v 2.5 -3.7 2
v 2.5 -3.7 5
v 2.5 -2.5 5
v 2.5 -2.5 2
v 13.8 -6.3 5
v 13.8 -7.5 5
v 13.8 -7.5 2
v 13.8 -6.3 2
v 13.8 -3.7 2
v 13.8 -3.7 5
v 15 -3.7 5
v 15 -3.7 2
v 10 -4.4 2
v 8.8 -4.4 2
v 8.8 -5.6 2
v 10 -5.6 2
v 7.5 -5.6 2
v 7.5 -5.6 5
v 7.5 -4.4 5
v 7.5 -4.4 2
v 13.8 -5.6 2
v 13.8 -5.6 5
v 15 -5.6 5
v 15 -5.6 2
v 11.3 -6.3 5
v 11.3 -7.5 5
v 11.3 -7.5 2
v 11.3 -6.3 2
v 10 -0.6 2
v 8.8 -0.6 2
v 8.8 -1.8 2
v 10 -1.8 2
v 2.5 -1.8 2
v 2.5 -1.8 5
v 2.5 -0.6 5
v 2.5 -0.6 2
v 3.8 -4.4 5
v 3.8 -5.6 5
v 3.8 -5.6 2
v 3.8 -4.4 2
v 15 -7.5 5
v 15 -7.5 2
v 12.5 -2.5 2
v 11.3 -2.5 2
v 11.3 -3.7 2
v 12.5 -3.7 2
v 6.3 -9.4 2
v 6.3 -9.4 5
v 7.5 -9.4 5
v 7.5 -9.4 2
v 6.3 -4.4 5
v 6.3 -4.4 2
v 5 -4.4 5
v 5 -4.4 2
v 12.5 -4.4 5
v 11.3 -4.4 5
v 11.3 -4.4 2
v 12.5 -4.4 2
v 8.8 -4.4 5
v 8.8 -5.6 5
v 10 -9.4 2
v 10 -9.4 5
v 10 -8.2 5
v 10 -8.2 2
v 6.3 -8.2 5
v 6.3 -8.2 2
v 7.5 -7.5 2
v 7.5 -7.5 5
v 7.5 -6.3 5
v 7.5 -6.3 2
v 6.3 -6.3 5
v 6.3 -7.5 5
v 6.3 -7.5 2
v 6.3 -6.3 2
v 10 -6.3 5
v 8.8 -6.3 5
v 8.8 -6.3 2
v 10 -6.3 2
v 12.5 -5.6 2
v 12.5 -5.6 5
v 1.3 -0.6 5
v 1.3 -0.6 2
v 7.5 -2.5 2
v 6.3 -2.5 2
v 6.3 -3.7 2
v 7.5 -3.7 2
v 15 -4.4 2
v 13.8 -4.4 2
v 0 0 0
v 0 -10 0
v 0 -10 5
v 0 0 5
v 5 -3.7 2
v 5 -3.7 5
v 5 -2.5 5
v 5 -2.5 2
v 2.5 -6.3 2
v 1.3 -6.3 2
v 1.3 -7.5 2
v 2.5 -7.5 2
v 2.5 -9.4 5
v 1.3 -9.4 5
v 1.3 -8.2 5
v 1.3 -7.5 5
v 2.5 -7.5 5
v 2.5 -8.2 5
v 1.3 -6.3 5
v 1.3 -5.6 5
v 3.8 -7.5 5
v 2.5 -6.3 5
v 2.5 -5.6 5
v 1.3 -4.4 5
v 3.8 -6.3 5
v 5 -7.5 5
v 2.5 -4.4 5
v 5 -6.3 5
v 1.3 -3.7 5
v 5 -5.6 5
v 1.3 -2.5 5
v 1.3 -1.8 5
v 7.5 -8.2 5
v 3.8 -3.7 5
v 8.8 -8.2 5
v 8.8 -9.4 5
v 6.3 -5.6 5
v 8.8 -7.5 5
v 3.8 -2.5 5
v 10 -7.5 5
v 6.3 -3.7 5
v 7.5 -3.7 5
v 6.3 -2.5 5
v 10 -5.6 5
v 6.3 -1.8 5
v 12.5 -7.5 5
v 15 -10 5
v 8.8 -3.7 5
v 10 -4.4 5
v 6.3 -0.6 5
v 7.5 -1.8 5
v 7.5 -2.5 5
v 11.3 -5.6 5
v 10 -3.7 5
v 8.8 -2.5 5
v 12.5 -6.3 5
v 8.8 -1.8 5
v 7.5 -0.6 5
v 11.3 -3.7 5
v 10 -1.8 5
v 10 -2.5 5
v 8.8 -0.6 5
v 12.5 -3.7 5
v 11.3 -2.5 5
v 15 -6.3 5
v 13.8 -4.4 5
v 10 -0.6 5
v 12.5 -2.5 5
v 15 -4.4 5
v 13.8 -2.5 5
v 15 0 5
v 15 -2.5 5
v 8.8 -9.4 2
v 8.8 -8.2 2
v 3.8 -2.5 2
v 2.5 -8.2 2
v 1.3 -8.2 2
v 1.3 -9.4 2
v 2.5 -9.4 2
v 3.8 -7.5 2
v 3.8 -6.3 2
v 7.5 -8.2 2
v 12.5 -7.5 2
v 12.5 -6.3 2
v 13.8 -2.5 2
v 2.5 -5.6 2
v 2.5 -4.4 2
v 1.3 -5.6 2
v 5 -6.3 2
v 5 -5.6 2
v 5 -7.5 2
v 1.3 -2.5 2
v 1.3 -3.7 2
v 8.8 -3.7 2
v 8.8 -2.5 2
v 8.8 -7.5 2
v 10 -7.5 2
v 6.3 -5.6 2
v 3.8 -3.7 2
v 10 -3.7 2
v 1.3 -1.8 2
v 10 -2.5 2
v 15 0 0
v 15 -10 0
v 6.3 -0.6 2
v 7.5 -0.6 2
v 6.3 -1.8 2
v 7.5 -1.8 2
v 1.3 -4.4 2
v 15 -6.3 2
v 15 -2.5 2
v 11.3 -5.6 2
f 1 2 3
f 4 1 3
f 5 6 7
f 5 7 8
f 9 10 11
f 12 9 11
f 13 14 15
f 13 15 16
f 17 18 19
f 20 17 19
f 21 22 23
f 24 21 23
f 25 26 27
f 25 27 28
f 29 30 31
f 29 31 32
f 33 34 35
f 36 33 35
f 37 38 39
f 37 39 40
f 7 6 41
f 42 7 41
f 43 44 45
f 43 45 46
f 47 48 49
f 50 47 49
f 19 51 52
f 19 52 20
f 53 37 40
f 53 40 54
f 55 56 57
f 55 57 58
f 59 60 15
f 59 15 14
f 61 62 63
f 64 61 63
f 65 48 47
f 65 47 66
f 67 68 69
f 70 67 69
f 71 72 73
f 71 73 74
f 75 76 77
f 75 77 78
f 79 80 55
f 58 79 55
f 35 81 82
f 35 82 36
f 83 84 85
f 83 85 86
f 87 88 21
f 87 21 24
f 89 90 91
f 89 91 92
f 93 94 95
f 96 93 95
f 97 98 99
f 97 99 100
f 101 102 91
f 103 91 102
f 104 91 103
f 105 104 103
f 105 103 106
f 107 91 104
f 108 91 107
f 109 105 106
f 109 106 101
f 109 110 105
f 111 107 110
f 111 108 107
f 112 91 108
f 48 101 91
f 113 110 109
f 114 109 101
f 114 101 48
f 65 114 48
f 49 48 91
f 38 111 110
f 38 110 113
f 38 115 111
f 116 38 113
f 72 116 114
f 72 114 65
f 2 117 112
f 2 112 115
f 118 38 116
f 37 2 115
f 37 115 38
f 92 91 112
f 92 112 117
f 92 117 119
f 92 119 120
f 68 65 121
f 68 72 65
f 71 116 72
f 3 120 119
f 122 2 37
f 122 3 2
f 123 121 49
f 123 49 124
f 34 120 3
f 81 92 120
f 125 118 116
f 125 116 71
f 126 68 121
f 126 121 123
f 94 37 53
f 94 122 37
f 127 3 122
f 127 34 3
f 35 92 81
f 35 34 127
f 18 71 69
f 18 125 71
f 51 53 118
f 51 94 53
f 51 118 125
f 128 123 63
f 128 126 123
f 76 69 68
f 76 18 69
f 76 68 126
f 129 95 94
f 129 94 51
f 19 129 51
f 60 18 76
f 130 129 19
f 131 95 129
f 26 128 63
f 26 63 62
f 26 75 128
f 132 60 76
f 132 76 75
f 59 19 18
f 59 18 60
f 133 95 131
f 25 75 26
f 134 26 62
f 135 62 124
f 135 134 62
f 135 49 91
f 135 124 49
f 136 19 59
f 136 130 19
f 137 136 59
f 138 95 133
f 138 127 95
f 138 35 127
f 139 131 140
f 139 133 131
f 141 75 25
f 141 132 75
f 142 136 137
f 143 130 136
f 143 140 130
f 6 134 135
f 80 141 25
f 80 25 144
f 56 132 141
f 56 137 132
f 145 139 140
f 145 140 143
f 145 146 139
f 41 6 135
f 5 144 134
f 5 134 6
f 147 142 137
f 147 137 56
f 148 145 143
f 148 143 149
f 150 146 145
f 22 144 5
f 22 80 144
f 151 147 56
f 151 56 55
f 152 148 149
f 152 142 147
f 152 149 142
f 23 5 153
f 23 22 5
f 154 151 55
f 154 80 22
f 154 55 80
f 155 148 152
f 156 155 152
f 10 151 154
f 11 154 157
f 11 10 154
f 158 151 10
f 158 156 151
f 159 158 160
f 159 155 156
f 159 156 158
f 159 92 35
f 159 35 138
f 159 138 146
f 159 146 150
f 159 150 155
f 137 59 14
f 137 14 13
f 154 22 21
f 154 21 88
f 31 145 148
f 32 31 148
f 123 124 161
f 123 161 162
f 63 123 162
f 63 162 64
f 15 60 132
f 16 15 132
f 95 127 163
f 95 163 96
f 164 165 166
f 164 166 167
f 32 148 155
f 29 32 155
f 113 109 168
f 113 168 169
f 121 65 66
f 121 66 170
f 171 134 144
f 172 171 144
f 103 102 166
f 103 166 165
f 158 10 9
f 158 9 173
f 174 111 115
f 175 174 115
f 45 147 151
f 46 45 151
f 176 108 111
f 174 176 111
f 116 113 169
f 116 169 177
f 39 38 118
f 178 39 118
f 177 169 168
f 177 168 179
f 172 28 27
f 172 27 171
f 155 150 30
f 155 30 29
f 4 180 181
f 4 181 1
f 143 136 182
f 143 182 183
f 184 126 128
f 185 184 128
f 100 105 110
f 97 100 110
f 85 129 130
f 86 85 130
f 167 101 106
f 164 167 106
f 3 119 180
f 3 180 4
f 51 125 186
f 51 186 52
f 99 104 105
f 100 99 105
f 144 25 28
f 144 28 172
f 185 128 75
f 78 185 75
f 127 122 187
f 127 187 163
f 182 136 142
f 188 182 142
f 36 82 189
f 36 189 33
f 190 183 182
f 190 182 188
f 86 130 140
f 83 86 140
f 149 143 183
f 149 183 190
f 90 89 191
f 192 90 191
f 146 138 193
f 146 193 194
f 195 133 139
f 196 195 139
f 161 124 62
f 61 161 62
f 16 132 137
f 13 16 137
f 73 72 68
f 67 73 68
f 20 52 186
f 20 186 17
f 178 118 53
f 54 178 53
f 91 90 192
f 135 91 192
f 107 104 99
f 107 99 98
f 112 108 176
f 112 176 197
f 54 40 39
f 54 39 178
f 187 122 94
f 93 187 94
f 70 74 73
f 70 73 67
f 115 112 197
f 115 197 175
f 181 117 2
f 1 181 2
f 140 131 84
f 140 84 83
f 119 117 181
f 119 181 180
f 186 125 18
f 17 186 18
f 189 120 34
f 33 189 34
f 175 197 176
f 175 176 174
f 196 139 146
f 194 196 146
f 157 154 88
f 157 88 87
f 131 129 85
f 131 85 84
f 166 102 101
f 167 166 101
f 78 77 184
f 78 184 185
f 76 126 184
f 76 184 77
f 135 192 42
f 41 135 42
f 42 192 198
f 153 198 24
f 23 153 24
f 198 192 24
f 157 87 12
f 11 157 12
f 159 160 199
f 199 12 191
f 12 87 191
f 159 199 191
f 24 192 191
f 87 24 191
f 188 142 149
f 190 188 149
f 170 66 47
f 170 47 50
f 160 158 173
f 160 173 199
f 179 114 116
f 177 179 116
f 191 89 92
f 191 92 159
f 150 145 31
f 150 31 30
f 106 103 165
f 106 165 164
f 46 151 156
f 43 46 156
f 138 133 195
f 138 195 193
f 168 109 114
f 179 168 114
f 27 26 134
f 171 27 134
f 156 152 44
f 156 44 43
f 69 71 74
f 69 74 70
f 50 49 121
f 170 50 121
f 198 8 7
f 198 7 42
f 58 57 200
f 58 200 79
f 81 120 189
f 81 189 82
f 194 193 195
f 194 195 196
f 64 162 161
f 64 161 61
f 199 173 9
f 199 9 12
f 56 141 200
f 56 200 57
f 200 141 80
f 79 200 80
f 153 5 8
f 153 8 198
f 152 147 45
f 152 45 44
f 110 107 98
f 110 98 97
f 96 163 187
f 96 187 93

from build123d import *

# Parameters (mm, degrees)
SKETCH_1_W          = 15
SKETCH_1_H          = 10
EXTRUDE_1_DEPTH     = 5
SKETCH_2_W          = 1.2
SKETCH_2_H          = 1.2
CUT_EXTRUDE_1_DEPTH = 3


with BuildPart() as part:
    # 草图1 → 凸台-拉伸1 (new body)
    with BuildSketch(Plane.XY):
        with Locations((7.5, -5)):
            Rectangle(SKETCH_1_W, SKETCH_1_H)
    extrude(amount=EXTRUDE_1_DEPTH)

    # 草图2 → 切除-拉伸1 (cut)
    with BuildSketch(Plane.XY.offset(5)):
        with Locations((1.9, -1.2)):
            Rectangle(SKETCH_2_W, SKETCH_2_H)
        with Locations((1.9, -3.1)):
            Rectangle(SKETCH_2_W, SKETCH_2_H)
        with Locations((1.9, -5)):
            Rectangle(SKETCH_2_W, SKETCH_2_H)
        with Locations((1.9, -6.9)):
            Rectangle(SKETCH_2_W, SKETCH_2_H)
        with Locations((1.9, -8.8)):
            Rectangle(SKETCH_2_W, SKETCH_2_H)
        with Locations((4.4, -3.1)):
            Rectangle(SKETCH_2_W, SKETCH_2_H)
        with Locations((6.9, -3.1)):
            Rectangle(SKETCH_2_W, SKETCH_2_H)
        with Locations((11.9, -3.1)):
            Rectangle(SKETCH_2_W, SKETCH_2_H)
        with Locations((9.4, -3.1)):
            Rectangle(SKETCH_2_W, SKETCH_2_H)
        with Locations((14.4, -3.1)):
            Rectangle(SKETCH_2_W, SKETCH_2_H)
        with Locations((4.4, -5)):
            Rectangle(SKETCH_2_W, SKETCH_2_H)
        with Locations((6.9, -5)):
            Rectangle(SKETCH_2_W, SKETCH_2_H)
        with Locations((9.4, -5)):
            Rectangle(SKETCH_2_W, SKETCH_2_H)
        with Locations((11.9, -5)):
            Rectangle(SKETCH_2_W, SKETCH_2_H)
        with Locations((14.4, -5)):
            Rectangle(SKETCH_2_W, SKETCH_2_H)
        with Locations((4.4, -6.9)):
            Rectangle(SKETCH_2_W, SKETCH_2_H)
        with Locations((6.9, -6.9)):
            Rectangle(SKETCH_2_W, SKETCH_2_H)
        with Locations((9.4, -6.9)):
            Rectangle(SKETCH_2_W, SKETCH_2_H)
        with Locations((11.9, -6.9)):
            Rectangle(SKETCH_2_W, SKETCH_2_H)
        with Locations((14.4, -6.9)):
            Rectangle(SKETCH_2_W, SKETCH_2_H)
        with Locations((6.9, -8.8)):
            Rectangle(SKETCH_2_W, SKETCH_2_H)
        with Locations((9.4, -8.8)):
            Rectangle(SKETCH_2_W, SKETCH_2_H)
        with Locations((6.9, -1.2)):
            Rectangle(SKETCH_2_W, SKETCH_2_H)
        with Locations((9.4, -1.2)):
            Rectangle(SKETCH_2_W, SKETCH_2_H)
    extrude(amount=-CUT_EXTRUDE_1_DEPTH, mode=Mode.SUBTRACT)


solid = part.part
